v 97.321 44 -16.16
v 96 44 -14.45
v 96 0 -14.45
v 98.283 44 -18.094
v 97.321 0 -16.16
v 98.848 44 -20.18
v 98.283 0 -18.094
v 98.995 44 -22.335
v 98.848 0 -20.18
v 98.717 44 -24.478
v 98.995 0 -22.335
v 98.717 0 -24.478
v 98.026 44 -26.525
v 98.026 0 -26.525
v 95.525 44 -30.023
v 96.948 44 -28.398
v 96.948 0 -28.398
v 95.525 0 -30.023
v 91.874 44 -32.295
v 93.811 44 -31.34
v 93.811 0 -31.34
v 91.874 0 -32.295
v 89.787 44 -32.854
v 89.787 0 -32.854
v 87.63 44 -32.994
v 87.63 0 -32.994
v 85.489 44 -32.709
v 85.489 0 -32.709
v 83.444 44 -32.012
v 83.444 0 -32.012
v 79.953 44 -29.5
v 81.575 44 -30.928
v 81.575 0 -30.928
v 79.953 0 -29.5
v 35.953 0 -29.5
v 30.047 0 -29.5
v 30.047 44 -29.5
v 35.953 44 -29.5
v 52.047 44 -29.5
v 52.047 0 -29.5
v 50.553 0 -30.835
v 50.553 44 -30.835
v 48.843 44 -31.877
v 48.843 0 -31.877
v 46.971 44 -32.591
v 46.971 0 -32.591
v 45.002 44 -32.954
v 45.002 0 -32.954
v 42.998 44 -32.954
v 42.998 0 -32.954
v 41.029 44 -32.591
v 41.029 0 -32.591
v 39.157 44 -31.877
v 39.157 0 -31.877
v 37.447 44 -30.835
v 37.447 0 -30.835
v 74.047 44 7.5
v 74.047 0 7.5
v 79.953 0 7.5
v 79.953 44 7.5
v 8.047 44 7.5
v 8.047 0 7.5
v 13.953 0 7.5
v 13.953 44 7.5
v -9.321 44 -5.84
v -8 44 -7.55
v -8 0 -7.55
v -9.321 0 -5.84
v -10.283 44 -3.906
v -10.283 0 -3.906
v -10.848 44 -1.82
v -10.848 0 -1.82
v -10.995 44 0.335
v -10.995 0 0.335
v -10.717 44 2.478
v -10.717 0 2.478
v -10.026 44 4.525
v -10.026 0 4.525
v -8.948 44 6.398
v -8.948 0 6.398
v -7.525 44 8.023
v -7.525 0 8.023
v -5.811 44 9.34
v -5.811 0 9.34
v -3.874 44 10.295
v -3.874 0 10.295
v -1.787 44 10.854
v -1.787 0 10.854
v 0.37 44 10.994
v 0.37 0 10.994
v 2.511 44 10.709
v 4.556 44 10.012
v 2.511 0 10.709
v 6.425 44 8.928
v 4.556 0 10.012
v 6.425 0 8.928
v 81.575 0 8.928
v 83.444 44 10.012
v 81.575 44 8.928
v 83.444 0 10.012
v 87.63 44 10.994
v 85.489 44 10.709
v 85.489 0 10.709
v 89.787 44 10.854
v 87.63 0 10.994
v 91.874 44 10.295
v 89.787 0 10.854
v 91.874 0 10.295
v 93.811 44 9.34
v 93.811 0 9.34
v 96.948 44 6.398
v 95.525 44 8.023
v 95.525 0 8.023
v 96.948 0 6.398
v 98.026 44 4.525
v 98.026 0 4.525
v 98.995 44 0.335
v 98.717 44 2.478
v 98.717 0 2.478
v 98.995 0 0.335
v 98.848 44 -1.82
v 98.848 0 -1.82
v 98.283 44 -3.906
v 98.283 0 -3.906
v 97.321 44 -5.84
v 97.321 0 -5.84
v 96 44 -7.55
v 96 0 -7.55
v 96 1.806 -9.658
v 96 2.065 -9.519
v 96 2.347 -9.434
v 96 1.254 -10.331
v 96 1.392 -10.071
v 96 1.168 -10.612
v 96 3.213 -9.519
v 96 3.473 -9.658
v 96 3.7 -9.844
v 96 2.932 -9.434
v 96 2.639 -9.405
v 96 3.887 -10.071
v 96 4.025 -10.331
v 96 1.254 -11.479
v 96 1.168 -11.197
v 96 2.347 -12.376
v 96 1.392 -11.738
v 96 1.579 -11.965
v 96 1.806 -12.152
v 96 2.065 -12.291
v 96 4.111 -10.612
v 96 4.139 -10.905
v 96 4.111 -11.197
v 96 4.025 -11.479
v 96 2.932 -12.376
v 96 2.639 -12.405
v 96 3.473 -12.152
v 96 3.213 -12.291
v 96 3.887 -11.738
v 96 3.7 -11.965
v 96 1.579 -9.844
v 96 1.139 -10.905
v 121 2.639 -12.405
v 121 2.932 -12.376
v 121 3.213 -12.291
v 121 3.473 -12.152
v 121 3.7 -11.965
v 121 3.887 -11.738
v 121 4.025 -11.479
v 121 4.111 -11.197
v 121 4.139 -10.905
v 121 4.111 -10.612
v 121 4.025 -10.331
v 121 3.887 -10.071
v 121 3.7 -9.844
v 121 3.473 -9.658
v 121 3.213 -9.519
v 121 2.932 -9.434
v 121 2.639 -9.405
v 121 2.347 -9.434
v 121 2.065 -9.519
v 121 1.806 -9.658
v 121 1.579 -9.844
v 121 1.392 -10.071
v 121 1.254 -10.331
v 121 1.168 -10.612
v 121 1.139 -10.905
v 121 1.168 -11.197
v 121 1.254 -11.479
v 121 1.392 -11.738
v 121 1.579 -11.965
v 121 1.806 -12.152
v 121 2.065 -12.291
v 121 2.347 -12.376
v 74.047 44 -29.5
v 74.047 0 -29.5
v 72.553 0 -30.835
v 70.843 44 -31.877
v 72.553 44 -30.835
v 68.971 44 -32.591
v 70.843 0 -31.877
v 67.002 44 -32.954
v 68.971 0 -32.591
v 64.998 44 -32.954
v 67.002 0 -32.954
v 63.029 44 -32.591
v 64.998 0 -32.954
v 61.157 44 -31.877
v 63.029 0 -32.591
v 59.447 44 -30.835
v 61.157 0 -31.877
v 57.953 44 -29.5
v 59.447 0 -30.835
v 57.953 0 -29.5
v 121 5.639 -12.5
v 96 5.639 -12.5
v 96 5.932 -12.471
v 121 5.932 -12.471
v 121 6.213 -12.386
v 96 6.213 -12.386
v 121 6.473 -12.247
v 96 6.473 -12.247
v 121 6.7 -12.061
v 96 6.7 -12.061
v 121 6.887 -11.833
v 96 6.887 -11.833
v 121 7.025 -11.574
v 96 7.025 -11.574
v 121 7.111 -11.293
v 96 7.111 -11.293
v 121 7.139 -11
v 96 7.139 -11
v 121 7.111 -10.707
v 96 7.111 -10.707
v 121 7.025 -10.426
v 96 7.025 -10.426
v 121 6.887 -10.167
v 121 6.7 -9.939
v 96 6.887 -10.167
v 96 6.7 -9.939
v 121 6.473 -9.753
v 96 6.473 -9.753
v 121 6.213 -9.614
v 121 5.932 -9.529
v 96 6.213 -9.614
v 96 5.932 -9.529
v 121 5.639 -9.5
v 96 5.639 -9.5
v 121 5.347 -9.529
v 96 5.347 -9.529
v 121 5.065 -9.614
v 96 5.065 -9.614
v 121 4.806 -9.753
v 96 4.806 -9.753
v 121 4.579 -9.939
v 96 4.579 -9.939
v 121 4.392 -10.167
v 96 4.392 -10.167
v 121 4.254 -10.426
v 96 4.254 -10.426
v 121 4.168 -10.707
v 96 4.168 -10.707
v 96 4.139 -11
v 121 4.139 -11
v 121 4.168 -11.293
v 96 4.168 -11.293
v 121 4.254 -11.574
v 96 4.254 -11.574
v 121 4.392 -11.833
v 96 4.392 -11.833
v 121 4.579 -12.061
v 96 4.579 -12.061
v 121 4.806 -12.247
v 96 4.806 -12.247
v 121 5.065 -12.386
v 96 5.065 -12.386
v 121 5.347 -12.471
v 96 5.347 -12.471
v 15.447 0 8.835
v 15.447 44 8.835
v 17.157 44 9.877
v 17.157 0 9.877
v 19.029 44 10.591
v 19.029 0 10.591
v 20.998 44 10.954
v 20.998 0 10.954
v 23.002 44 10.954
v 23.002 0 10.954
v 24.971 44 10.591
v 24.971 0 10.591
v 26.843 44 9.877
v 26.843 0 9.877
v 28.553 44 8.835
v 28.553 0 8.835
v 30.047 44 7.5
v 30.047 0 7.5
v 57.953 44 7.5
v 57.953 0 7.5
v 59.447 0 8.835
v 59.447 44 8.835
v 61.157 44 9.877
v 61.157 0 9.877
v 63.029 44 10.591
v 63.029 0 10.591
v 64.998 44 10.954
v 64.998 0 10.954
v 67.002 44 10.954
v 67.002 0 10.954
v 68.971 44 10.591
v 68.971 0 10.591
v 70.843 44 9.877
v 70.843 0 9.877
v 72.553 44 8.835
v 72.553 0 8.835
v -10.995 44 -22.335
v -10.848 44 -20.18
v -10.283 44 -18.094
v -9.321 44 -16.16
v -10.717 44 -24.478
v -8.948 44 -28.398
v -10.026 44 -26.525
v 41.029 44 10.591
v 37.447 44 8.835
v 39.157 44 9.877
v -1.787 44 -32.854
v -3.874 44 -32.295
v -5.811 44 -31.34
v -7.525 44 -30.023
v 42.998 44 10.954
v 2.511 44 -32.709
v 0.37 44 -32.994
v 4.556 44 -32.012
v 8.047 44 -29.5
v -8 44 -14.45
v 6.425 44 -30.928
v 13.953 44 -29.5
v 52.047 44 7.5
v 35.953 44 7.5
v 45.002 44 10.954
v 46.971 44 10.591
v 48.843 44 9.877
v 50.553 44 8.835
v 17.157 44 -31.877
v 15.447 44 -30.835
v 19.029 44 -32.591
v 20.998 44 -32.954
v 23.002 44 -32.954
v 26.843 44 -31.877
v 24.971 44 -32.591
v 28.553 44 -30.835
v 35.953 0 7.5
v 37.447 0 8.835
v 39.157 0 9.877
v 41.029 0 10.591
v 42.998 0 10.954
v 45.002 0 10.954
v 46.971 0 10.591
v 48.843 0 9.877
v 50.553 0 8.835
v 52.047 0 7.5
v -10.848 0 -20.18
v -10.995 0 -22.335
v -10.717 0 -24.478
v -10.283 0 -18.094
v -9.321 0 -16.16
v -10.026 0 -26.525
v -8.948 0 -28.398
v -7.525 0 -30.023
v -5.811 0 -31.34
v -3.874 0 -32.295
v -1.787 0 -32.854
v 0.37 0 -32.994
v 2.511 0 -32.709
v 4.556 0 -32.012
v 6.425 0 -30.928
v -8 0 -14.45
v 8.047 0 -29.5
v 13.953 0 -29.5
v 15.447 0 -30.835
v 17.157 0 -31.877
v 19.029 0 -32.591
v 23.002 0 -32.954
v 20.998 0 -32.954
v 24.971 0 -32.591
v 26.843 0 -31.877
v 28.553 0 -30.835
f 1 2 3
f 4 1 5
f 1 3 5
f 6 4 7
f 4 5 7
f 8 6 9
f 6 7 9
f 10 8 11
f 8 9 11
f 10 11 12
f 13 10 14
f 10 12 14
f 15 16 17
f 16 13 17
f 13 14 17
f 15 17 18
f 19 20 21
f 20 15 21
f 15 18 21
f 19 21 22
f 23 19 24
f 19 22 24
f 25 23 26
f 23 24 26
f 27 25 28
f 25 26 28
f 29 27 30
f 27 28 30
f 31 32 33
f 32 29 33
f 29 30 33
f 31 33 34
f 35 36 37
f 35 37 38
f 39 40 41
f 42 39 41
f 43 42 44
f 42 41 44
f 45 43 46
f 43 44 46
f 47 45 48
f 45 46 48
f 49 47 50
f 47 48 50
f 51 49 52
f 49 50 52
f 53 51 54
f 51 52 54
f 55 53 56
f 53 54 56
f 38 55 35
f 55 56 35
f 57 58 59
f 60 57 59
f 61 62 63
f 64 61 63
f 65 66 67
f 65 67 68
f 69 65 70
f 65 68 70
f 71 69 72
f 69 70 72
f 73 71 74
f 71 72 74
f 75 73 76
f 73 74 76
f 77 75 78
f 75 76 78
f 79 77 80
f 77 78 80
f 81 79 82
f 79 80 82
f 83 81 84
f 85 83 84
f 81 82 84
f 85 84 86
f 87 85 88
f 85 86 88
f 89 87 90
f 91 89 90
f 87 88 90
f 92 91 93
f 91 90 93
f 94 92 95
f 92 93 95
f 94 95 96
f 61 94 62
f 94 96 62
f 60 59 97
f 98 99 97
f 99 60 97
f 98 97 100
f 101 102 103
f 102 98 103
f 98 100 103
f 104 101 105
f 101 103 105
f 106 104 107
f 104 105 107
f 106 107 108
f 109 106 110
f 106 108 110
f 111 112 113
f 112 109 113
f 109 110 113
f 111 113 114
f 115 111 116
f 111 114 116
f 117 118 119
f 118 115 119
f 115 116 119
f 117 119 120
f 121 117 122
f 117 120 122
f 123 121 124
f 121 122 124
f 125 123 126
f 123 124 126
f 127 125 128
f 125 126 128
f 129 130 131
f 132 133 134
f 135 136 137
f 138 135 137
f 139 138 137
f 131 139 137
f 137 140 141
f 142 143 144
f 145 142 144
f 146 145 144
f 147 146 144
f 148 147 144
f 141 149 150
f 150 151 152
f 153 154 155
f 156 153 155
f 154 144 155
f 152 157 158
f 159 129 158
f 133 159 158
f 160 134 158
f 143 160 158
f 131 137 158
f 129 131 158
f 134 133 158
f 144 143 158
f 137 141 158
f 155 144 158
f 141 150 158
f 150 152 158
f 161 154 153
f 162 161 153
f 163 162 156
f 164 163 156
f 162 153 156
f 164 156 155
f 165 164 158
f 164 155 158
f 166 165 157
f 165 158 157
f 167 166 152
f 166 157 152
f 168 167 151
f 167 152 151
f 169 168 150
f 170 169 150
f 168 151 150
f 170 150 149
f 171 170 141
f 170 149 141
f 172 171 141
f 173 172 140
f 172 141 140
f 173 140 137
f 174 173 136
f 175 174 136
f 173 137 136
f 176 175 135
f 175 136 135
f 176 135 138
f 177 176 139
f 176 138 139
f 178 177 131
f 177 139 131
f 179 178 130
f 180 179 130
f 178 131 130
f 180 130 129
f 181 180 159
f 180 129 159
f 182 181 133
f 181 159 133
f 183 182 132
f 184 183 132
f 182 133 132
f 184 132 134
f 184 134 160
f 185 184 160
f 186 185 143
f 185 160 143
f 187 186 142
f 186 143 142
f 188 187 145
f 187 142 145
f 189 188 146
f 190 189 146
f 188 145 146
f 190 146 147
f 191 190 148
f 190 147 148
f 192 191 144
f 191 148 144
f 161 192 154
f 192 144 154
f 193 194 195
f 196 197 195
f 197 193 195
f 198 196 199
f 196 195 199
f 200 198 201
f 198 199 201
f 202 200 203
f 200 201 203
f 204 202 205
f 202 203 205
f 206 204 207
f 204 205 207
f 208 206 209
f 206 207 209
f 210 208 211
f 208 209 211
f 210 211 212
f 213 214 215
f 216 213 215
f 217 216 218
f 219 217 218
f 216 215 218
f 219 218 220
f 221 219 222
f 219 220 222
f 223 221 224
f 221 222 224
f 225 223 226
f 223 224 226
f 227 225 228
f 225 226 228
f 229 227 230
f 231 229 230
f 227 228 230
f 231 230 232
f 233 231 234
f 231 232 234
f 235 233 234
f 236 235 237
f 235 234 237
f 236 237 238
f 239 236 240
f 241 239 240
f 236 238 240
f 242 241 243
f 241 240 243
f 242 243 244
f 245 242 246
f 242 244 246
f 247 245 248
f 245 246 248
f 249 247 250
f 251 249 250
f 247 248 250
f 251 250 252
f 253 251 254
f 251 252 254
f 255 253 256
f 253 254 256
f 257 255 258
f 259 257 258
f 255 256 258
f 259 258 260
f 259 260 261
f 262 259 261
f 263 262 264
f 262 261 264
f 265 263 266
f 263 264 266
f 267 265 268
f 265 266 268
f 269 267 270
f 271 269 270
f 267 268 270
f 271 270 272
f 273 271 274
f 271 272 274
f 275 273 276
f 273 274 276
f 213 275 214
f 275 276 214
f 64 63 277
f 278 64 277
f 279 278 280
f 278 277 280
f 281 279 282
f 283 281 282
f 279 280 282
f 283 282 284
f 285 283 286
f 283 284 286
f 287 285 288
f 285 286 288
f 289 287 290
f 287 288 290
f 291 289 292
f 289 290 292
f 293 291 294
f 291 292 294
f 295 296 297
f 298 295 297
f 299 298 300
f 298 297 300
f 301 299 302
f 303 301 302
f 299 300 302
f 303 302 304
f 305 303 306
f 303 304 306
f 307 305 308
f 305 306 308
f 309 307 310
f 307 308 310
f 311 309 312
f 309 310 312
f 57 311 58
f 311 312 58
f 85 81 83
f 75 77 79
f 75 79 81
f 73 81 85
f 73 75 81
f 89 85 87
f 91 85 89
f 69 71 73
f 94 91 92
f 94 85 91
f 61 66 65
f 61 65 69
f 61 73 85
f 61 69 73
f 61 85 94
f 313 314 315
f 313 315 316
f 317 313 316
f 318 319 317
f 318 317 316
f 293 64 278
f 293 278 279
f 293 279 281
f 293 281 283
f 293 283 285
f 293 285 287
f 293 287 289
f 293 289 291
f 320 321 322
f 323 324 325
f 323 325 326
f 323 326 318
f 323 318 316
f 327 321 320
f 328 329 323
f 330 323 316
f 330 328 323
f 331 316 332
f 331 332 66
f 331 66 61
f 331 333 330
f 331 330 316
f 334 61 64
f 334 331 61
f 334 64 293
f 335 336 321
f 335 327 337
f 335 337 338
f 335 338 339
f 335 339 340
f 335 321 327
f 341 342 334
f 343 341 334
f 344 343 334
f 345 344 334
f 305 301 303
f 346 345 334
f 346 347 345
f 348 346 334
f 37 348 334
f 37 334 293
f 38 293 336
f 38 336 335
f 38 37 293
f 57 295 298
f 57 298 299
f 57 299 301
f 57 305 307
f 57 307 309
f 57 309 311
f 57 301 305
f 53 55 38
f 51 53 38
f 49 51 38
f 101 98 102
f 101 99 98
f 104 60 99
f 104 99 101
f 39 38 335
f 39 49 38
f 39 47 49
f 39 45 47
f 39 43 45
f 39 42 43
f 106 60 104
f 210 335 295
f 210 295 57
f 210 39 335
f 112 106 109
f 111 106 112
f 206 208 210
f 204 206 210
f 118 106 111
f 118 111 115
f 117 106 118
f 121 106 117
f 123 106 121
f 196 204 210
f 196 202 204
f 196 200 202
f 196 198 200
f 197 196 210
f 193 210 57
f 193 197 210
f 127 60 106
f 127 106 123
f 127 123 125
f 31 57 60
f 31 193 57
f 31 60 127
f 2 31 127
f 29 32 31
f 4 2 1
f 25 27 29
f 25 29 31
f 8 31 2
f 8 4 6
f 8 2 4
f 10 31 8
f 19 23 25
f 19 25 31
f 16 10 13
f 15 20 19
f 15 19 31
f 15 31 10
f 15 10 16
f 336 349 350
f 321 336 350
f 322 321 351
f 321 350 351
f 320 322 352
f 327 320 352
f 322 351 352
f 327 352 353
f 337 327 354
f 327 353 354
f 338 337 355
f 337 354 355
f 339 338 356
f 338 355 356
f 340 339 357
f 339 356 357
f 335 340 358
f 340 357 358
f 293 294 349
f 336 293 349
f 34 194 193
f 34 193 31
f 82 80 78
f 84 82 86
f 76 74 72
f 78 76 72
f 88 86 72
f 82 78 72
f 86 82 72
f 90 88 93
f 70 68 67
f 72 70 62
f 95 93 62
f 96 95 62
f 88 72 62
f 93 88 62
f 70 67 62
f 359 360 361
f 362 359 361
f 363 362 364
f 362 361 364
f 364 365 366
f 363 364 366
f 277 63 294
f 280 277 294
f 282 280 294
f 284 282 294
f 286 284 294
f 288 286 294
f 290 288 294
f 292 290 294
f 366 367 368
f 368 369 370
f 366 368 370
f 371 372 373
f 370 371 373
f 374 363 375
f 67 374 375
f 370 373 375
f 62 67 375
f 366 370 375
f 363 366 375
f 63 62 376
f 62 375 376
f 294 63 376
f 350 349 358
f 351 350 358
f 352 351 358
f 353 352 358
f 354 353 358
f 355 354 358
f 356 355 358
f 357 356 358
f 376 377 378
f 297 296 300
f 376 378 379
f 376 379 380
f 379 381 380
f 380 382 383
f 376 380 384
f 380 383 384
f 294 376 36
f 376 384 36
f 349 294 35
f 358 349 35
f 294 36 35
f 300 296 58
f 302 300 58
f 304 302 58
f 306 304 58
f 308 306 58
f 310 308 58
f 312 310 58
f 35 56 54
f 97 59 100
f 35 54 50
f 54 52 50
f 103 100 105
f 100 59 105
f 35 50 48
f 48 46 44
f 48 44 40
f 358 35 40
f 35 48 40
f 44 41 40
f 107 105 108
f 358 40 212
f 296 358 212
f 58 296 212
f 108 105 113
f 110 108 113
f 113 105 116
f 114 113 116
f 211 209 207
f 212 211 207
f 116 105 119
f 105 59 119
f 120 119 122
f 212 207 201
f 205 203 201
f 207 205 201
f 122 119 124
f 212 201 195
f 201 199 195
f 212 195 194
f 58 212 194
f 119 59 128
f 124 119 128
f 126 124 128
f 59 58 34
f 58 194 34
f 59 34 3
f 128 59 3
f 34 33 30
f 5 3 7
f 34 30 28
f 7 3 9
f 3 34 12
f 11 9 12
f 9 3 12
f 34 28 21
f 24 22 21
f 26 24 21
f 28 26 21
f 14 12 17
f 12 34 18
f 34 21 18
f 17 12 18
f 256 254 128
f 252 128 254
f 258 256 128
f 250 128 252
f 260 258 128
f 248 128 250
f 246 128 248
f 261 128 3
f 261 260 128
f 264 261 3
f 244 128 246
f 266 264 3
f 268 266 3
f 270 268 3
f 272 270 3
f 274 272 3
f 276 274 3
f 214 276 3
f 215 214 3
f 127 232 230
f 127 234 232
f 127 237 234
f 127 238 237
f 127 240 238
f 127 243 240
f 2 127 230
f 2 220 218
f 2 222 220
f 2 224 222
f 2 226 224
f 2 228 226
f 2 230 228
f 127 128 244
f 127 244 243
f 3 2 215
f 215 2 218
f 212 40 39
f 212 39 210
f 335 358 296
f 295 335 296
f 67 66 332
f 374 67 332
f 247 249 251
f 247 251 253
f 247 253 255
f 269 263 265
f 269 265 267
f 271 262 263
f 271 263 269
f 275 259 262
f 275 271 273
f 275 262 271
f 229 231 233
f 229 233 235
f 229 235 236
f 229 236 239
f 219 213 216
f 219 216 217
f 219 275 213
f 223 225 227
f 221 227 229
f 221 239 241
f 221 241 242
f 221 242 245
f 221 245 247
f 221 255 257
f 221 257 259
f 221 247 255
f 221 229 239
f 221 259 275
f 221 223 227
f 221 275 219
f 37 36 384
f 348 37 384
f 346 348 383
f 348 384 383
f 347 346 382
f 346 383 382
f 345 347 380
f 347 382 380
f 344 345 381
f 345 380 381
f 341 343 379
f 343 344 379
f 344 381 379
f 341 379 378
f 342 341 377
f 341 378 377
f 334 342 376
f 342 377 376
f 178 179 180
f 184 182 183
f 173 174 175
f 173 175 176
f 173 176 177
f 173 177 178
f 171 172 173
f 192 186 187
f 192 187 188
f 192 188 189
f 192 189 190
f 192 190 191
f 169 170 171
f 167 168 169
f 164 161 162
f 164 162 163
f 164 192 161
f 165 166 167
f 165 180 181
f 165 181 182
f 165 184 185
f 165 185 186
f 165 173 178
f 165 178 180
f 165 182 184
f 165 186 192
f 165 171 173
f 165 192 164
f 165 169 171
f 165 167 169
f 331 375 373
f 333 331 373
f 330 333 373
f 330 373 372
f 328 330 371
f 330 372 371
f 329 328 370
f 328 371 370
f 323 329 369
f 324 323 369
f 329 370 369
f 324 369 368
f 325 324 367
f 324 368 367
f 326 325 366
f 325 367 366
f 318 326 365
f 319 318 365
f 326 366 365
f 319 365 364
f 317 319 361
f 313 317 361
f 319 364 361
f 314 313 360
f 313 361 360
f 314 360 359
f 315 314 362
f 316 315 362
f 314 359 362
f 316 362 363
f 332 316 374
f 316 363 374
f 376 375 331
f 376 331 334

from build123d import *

# Parameters (mm, degrees)
SKETCH1_R         = 11
EXTRUDE1_DEPTH    = 44
EXTRUDE1_2_DEPTH  = 44
EXTRUDE1_3_DEPTH  = 44
EXTRUDE1_4_DEPTH  = 44
EXTRUDE1_5_DEPTH  = 44
EXTRUDE1_6_DEPTH  = 44
EXTRUDE1_7_DEPTH  = 44
EXTRUDE1_8_DEPTH  = 44
EXTRUDE1_9_DEPTH  = 44
EXTRUDE1_10_DEPTH = 44
SKETCH2_W         = 104
SKETCH2_H         = 37
EXTRUDE7_DEPTH    = 44
SKETCH4_R         = 1.5
EXTRUDE12_DEPTH   = 25
SKETCH5_R         = 1.5
EXTRUDE14_DEPTH   = 25


with BuildPart() as part:
    # Sketch1 → Extrude1 (new body)
    with BuildSketch(Plane(origin=(0, 0, 0), x_dir=(1, 0, 0), z_dir=(0, 1, 0))):
        Circle(SKETCH1_R)
    extrude(amount=EXTRUDE1_DEPTH)



with BuildPart() as body_2:
    # Sketch1 → Extrude1 2 (new body)
    with BuildSketch(Plane(origin=(0, 0, 0), x_dir=(1, 0, 0), z_dir=(0, 1, 0))):
        with Locations((22, 0)):
            Circle(SKETCH1_R)
    extrude(amount=EXTRUDE1_2_DEPTH)


with BuildPart() as body_3:
    # Sketch1 → Extrude1 3 (new body)
    with BuildSketch(Plane(origin=(0, 0, 0), x_dir=(1, 0, 0), z_dir=(0, 1, 0))):
        with Locations((44, 0)):
            Circle(SKETCH1_R)
    extrude(amount=EXTRUDE1_3_DEPTH)


with BuildPart() as body_4:
    # Sketch1 → Extrude1 4 (new body)
    with BuildSketch(Plane(origin=(0, 0, 0), x_dir=(1, 0, 0), z_dir=(0, 1, 0))):
        with Locations((66, 0)):
            Circle(SKETCH1_R)
    extrude(amount=EXTRUDE1_4_DEPTH)


with BuildPart() as body_5:
    # Sketch1 → Extrude1 5 (new body)
    with BuildSketch(Plane(origin=(0, 0, 0), x_dir=(1, 0, 0), z_dir=(0, 1, 0))):
        with Locations((88, 0)):
            Circle(SKETCH1_R)
    extrude(amount=EXTRUDE1_5_DEPTH)


with BuildPart() as body_6:
    # Sketch1 → Extrude1 6 (new body)
    with BuildSketch(Plane(origin=(0, 0, 0), x_dir=(1, 0, 0), z_dir=(0, 1, 0))):
        with Locations((0, 22)):
            Circle(SKETCH1_R)
    extrude(amount=EXTRUDE1_6_DEPTH)


with BuildPart() as body_7:
    # Sketch1 → Extrude1 7 (new body)
    with BuildSketch(Plane(origin=(0, 0, 0), x_dir=(1, 0, 0), z_dir=(0, 1, 0))):
        with Locations((22, 22)):
            Circle(SKETCH1_R)
    extrude(amount=EXTRUDE1_7_DEPTH)


with BuildPart() as body_8:
    # Sketch1 → Extrude1 8 (new body)
    with BuildSketch(Plane(origin=(0, 0, 0), x_dir=(1, 0, 0), z_dir=(0, 1, 0))):
        with Locations((44, 22)):
            Circle(SKETCH1_R)
    extrude(amount=EXTRUDE1_8_DEPTH)


with BuildPart() as body_9:
    # Sketch1 → Extrude1 9 (new body)
    with BuildSketch(Plane(origin=(0, 0, 0), x_dir=(1, 0, 0), z_dir=(0, 1, 0))):
        with Locations((66, 22)):
            Circle(SKETCH1_R)
    extrude(amount=EXTRUDE1_9_DEPTH)


with BuildPart() as body_10:
    # Sketch1 → Extrude1 10 (new body)
    with BuildSketch(Plane(origin=(0, 0, 0), x_dir=(1, 0, 0), z_dir=(0, 1, 0))):
        with Locations((88, 22)):
            Circle(SKETCH1_R)
    extrude(amount=EXTRUDE1_10_DEPTH)


with BuildPart() as part_1:
    add(part.part)

    add(body_2.part)  # Extrude7 merges body 2

    add(body_3.part)  # Extrude7 merges body 3

    add(body_4.part)  # Extrude7 merges body 4

    add(body_5.part)  # Extrude7 merges body 5

    add(body_6.part)  # Extrude7 merges body 6

    add(body_7.part)  # Extrude7 merges body 7

    add(body_8.part)  # Extrude7 merges body 8

    add(body_9.part)  # Extrude7 merges body 9

    add(body_10.part)  # Extrude7 merges body 10
    # Sketch2 → Extrude7 (add)
    with BuildSketch(Plane(origin=(0, 44, 0), x_dir=(1, 0, 0), z_dir=(0, 1, 0))):
        with Locations((44, 11)):
            Rectangle(SKETCH2_W, SKETCH2_H)
    extrude(amount=-EXTRUDE7_DEPTH)

    # Sketch4 → Extrude12 (add)
    with BuildSketch(Plane(origin=(96, 0, 0), x_dir=(0, 0, -1), z_dir=(1, 0, 0))):
        with Locations((11, 5.639322164)):
            Circle(SKETCH4_R)
    extrude(amount=EXTRUDE12_DEPTH)


with BuildPart() as body_2_2:
    # Sketch5 → Extrude14 (new body)
    with BuildSketch(Plane(origin=(96, 0, 0), x_dir=(0, 0, -1), z_dir=(1, 0, 0))):
        with Locations((10.904759515, 2.639322164)):
            Circle(SKETCH5_R)
    extrude(amount=EXTRUDE14_DEPTH)


solid = Compound([part_1.part, body_2_2.part])
